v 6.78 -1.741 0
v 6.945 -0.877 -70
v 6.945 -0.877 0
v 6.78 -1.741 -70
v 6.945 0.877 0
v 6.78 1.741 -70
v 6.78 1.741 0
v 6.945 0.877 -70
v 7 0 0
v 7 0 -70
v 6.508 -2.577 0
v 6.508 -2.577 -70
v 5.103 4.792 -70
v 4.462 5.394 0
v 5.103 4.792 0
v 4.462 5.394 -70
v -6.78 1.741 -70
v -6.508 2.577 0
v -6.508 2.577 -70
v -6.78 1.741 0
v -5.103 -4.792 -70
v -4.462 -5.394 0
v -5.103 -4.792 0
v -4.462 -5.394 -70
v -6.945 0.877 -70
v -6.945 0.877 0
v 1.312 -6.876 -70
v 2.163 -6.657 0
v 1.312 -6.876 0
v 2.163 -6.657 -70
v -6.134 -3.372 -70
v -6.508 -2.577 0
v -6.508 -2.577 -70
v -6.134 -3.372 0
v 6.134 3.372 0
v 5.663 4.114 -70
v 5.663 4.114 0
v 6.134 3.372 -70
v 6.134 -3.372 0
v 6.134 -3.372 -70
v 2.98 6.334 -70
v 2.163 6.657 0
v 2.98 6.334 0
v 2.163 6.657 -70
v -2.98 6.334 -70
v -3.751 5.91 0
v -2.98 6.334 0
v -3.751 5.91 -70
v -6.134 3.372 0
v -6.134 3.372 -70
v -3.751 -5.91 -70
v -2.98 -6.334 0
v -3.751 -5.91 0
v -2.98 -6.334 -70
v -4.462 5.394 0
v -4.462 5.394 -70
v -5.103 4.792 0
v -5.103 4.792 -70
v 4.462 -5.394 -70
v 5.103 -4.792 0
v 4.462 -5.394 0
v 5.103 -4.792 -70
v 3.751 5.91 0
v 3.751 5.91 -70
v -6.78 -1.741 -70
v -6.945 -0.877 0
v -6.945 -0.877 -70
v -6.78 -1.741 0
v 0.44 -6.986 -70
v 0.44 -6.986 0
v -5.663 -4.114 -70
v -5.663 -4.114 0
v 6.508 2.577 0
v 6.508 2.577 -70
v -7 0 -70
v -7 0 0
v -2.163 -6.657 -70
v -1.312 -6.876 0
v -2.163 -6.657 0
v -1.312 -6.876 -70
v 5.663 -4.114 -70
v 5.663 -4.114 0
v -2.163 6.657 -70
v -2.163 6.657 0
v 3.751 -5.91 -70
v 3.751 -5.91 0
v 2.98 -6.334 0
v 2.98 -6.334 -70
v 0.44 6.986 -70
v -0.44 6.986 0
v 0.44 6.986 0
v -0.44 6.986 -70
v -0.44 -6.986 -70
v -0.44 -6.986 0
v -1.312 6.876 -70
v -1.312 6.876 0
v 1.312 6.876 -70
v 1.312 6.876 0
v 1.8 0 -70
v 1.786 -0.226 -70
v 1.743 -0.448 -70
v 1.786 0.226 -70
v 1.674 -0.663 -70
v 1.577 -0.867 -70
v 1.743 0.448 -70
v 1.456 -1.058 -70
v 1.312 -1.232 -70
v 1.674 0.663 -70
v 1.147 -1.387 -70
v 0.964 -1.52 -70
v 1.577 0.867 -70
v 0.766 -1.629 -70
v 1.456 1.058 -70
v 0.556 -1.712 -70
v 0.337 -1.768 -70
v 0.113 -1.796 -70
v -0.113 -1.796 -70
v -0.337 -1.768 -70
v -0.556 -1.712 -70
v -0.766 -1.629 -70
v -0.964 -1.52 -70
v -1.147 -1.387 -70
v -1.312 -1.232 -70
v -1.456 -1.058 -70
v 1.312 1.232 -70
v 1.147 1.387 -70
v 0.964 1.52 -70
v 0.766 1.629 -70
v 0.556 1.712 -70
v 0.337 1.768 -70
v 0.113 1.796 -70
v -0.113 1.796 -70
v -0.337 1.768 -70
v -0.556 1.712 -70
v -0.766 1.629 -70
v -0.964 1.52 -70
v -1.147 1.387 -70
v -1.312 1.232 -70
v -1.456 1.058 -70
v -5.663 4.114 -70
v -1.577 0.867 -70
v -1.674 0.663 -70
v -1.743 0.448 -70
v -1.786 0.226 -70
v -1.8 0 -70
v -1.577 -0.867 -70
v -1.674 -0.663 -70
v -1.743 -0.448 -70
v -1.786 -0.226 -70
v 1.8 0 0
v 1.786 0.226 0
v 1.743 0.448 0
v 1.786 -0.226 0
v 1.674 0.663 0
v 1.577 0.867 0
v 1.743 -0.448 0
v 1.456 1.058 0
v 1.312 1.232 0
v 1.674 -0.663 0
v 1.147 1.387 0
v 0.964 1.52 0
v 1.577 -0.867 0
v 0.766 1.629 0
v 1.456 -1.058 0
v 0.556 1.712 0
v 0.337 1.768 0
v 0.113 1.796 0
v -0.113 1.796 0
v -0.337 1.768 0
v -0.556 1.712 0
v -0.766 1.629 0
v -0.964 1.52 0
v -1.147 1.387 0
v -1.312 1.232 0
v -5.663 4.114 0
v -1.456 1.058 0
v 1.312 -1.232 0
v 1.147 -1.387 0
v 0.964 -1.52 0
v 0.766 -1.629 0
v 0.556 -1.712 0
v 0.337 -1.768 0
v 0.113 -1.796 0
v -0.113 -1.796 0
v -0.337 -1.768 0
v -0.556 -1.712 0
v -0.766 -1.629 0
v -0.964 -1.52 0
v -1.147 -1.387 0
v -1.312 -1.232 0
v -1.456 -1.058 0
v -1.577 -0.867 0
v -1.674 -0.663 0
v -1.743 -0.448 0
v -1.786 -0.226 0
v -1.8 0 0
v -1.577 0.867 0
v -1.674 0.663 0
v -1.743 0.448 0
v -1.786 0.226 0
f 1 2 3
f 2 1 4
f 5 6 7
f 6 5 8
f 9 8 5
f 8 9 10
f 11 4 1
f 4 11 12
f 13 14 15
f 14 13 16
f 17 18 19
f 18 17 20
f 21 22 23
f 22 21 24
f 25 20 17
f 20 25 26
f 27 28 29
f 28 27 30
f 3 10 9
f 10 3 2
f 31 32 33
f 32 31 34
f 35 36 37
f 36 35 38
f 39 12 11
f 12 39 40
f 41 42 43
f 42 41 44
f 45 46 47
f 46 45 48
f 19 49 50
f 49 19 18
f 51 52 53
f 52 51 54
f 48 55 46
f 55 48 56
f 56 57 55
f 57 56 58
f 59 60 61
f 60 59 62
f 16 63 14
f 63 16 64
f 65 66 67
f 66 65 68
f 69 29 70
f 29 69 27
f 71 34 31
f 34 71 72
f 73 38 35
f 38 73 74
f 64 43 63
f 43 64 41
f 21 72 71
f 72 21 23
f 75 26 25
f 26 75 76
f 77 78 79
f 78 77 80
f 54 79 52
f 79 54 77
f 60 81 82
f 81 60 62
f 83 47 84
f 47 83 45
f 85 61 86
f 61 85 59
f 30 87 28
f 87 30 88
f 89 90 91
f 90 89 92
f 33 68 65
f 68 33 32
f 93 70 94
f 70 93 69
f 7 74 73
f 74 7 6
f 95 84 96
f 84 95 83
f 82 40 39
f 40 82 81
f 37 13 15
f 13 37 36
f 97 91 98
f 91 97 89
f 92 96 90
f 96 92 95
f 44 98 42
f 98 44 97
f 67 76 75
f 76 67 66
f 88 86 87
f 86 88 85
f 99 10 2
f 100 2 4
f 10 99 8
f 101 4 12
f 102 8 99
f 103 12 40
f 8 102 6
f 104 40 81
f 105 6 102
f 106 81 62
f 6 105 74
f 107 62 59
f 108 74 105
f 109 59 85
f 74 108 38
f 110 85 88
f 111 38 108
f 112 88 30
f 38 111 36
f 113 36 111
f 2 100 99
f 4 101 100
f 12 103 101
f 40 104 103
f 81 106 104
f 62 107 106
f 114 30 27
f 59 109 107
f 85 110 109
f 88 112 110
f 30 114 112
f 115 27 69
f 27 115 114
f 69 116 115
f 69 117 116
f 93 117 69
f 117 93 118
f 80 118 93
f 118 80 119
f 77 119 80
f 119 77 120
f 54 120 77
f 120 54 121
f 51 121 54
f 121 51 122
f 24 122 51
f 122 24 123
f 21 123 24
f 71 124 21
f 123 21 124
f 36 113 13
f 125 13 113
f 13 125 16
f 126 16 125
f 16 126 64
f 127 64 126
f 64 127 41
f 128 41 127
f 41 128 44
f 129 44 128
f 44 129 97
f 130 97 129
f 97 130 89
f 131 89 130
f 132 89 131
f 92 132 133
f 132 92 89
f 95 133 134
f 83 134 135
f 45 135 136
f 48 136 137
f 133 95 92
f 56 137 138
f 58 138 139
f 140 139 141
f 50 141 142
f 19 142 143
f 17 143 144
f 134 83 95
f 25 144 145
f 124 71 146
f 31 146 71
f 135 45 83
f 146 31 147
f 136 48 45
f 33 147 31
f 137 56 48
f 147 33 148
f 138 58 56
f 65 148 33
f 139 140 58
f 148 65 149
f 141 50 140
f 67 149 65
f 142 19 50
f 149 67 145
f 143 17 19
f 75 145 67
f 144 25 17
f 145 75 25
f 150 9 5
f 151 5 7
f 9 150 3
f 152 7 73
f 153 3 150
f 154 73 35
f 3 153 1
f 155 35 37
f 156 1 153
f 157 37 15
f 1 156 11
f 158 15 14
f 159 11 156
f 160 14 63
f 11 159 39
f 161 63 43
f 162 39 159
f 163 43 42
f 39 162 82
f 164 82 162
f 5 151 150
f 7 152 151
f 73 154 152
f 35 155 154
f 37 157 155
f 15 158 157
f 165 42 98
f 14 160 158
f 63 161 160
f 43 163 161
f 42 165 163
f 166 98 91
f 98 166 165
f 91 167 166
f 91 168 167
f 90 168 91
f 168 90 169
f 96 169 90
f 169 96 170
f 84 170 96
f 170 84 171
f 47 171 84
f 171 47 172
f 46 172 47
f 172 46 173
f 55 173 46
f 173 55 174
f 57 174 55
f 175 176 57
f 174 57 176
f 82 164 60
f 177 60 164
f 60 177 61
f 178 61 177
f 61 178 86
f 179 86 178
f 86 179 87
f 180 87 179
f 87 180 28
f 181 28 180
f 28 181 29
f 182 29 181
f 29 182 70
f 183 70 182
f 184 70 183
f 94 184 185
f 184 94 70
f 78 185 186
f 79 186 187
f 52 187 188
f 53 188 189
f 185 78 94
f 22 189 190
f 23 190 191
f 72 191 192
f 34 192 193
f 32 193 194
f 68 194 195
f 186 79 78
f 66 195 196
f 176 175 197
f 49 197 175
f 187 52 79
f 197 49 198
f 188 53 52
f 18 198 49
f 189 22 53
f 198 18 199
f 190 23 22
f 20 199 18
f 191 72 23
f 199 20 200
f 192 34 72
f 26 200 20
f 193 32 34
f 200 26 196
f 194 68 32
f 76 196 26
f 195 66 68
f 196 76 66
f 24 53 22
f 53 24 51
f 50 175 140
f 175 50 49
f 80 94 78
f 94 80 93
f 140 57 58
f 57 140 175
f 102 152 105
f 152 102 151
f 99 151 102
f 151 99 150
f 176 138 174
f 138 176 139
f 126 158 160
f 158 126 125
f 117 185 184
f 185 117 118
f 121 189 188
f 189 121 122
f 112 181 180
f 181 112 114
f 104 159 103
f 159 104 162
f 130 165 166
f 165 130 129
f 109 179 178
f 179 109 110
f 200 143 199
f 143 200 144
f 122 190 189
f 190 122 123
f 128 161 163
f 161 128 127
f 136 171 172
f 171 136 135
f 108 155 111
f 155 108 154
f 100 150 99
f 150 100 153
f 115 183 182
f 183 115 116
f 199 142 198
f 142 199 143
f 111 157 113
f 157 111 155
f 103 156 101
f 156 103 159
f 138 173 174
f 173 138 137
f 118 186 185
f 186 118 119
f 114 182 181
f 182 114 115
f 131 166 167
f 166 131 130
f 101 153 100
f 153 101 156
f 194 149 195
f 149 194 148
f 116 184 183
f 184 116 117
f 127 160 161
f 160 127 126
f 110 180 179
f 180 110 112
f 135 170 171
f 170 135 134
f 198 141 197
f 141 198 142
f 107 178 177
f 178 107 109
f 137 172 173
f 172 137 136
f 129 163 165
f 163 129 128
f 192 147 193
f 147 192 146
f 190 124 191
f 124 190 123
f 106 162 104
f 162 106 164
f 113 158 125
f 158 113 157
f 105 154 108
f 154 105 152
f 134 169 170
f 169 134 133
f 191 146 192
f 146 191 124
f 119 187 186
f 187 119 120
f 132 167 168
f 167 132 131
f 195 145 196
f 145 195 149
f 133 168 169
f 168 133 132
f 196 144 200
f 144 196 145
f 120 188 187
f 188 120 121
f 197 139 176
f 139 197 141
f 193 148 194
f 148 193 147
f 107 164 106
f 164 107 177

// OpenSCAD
$fn = 50;


difference() {
	union() {
		translate(v = [0, 0, -70.0000000000]) {
			cylinder(h = 70, r = 7.0000000000);
		}
	}
	union() {
		#translate(v = [0, 0, -70]) {
			cylinder(h = 70, r = 1.8000000000);
		}
	}
}
